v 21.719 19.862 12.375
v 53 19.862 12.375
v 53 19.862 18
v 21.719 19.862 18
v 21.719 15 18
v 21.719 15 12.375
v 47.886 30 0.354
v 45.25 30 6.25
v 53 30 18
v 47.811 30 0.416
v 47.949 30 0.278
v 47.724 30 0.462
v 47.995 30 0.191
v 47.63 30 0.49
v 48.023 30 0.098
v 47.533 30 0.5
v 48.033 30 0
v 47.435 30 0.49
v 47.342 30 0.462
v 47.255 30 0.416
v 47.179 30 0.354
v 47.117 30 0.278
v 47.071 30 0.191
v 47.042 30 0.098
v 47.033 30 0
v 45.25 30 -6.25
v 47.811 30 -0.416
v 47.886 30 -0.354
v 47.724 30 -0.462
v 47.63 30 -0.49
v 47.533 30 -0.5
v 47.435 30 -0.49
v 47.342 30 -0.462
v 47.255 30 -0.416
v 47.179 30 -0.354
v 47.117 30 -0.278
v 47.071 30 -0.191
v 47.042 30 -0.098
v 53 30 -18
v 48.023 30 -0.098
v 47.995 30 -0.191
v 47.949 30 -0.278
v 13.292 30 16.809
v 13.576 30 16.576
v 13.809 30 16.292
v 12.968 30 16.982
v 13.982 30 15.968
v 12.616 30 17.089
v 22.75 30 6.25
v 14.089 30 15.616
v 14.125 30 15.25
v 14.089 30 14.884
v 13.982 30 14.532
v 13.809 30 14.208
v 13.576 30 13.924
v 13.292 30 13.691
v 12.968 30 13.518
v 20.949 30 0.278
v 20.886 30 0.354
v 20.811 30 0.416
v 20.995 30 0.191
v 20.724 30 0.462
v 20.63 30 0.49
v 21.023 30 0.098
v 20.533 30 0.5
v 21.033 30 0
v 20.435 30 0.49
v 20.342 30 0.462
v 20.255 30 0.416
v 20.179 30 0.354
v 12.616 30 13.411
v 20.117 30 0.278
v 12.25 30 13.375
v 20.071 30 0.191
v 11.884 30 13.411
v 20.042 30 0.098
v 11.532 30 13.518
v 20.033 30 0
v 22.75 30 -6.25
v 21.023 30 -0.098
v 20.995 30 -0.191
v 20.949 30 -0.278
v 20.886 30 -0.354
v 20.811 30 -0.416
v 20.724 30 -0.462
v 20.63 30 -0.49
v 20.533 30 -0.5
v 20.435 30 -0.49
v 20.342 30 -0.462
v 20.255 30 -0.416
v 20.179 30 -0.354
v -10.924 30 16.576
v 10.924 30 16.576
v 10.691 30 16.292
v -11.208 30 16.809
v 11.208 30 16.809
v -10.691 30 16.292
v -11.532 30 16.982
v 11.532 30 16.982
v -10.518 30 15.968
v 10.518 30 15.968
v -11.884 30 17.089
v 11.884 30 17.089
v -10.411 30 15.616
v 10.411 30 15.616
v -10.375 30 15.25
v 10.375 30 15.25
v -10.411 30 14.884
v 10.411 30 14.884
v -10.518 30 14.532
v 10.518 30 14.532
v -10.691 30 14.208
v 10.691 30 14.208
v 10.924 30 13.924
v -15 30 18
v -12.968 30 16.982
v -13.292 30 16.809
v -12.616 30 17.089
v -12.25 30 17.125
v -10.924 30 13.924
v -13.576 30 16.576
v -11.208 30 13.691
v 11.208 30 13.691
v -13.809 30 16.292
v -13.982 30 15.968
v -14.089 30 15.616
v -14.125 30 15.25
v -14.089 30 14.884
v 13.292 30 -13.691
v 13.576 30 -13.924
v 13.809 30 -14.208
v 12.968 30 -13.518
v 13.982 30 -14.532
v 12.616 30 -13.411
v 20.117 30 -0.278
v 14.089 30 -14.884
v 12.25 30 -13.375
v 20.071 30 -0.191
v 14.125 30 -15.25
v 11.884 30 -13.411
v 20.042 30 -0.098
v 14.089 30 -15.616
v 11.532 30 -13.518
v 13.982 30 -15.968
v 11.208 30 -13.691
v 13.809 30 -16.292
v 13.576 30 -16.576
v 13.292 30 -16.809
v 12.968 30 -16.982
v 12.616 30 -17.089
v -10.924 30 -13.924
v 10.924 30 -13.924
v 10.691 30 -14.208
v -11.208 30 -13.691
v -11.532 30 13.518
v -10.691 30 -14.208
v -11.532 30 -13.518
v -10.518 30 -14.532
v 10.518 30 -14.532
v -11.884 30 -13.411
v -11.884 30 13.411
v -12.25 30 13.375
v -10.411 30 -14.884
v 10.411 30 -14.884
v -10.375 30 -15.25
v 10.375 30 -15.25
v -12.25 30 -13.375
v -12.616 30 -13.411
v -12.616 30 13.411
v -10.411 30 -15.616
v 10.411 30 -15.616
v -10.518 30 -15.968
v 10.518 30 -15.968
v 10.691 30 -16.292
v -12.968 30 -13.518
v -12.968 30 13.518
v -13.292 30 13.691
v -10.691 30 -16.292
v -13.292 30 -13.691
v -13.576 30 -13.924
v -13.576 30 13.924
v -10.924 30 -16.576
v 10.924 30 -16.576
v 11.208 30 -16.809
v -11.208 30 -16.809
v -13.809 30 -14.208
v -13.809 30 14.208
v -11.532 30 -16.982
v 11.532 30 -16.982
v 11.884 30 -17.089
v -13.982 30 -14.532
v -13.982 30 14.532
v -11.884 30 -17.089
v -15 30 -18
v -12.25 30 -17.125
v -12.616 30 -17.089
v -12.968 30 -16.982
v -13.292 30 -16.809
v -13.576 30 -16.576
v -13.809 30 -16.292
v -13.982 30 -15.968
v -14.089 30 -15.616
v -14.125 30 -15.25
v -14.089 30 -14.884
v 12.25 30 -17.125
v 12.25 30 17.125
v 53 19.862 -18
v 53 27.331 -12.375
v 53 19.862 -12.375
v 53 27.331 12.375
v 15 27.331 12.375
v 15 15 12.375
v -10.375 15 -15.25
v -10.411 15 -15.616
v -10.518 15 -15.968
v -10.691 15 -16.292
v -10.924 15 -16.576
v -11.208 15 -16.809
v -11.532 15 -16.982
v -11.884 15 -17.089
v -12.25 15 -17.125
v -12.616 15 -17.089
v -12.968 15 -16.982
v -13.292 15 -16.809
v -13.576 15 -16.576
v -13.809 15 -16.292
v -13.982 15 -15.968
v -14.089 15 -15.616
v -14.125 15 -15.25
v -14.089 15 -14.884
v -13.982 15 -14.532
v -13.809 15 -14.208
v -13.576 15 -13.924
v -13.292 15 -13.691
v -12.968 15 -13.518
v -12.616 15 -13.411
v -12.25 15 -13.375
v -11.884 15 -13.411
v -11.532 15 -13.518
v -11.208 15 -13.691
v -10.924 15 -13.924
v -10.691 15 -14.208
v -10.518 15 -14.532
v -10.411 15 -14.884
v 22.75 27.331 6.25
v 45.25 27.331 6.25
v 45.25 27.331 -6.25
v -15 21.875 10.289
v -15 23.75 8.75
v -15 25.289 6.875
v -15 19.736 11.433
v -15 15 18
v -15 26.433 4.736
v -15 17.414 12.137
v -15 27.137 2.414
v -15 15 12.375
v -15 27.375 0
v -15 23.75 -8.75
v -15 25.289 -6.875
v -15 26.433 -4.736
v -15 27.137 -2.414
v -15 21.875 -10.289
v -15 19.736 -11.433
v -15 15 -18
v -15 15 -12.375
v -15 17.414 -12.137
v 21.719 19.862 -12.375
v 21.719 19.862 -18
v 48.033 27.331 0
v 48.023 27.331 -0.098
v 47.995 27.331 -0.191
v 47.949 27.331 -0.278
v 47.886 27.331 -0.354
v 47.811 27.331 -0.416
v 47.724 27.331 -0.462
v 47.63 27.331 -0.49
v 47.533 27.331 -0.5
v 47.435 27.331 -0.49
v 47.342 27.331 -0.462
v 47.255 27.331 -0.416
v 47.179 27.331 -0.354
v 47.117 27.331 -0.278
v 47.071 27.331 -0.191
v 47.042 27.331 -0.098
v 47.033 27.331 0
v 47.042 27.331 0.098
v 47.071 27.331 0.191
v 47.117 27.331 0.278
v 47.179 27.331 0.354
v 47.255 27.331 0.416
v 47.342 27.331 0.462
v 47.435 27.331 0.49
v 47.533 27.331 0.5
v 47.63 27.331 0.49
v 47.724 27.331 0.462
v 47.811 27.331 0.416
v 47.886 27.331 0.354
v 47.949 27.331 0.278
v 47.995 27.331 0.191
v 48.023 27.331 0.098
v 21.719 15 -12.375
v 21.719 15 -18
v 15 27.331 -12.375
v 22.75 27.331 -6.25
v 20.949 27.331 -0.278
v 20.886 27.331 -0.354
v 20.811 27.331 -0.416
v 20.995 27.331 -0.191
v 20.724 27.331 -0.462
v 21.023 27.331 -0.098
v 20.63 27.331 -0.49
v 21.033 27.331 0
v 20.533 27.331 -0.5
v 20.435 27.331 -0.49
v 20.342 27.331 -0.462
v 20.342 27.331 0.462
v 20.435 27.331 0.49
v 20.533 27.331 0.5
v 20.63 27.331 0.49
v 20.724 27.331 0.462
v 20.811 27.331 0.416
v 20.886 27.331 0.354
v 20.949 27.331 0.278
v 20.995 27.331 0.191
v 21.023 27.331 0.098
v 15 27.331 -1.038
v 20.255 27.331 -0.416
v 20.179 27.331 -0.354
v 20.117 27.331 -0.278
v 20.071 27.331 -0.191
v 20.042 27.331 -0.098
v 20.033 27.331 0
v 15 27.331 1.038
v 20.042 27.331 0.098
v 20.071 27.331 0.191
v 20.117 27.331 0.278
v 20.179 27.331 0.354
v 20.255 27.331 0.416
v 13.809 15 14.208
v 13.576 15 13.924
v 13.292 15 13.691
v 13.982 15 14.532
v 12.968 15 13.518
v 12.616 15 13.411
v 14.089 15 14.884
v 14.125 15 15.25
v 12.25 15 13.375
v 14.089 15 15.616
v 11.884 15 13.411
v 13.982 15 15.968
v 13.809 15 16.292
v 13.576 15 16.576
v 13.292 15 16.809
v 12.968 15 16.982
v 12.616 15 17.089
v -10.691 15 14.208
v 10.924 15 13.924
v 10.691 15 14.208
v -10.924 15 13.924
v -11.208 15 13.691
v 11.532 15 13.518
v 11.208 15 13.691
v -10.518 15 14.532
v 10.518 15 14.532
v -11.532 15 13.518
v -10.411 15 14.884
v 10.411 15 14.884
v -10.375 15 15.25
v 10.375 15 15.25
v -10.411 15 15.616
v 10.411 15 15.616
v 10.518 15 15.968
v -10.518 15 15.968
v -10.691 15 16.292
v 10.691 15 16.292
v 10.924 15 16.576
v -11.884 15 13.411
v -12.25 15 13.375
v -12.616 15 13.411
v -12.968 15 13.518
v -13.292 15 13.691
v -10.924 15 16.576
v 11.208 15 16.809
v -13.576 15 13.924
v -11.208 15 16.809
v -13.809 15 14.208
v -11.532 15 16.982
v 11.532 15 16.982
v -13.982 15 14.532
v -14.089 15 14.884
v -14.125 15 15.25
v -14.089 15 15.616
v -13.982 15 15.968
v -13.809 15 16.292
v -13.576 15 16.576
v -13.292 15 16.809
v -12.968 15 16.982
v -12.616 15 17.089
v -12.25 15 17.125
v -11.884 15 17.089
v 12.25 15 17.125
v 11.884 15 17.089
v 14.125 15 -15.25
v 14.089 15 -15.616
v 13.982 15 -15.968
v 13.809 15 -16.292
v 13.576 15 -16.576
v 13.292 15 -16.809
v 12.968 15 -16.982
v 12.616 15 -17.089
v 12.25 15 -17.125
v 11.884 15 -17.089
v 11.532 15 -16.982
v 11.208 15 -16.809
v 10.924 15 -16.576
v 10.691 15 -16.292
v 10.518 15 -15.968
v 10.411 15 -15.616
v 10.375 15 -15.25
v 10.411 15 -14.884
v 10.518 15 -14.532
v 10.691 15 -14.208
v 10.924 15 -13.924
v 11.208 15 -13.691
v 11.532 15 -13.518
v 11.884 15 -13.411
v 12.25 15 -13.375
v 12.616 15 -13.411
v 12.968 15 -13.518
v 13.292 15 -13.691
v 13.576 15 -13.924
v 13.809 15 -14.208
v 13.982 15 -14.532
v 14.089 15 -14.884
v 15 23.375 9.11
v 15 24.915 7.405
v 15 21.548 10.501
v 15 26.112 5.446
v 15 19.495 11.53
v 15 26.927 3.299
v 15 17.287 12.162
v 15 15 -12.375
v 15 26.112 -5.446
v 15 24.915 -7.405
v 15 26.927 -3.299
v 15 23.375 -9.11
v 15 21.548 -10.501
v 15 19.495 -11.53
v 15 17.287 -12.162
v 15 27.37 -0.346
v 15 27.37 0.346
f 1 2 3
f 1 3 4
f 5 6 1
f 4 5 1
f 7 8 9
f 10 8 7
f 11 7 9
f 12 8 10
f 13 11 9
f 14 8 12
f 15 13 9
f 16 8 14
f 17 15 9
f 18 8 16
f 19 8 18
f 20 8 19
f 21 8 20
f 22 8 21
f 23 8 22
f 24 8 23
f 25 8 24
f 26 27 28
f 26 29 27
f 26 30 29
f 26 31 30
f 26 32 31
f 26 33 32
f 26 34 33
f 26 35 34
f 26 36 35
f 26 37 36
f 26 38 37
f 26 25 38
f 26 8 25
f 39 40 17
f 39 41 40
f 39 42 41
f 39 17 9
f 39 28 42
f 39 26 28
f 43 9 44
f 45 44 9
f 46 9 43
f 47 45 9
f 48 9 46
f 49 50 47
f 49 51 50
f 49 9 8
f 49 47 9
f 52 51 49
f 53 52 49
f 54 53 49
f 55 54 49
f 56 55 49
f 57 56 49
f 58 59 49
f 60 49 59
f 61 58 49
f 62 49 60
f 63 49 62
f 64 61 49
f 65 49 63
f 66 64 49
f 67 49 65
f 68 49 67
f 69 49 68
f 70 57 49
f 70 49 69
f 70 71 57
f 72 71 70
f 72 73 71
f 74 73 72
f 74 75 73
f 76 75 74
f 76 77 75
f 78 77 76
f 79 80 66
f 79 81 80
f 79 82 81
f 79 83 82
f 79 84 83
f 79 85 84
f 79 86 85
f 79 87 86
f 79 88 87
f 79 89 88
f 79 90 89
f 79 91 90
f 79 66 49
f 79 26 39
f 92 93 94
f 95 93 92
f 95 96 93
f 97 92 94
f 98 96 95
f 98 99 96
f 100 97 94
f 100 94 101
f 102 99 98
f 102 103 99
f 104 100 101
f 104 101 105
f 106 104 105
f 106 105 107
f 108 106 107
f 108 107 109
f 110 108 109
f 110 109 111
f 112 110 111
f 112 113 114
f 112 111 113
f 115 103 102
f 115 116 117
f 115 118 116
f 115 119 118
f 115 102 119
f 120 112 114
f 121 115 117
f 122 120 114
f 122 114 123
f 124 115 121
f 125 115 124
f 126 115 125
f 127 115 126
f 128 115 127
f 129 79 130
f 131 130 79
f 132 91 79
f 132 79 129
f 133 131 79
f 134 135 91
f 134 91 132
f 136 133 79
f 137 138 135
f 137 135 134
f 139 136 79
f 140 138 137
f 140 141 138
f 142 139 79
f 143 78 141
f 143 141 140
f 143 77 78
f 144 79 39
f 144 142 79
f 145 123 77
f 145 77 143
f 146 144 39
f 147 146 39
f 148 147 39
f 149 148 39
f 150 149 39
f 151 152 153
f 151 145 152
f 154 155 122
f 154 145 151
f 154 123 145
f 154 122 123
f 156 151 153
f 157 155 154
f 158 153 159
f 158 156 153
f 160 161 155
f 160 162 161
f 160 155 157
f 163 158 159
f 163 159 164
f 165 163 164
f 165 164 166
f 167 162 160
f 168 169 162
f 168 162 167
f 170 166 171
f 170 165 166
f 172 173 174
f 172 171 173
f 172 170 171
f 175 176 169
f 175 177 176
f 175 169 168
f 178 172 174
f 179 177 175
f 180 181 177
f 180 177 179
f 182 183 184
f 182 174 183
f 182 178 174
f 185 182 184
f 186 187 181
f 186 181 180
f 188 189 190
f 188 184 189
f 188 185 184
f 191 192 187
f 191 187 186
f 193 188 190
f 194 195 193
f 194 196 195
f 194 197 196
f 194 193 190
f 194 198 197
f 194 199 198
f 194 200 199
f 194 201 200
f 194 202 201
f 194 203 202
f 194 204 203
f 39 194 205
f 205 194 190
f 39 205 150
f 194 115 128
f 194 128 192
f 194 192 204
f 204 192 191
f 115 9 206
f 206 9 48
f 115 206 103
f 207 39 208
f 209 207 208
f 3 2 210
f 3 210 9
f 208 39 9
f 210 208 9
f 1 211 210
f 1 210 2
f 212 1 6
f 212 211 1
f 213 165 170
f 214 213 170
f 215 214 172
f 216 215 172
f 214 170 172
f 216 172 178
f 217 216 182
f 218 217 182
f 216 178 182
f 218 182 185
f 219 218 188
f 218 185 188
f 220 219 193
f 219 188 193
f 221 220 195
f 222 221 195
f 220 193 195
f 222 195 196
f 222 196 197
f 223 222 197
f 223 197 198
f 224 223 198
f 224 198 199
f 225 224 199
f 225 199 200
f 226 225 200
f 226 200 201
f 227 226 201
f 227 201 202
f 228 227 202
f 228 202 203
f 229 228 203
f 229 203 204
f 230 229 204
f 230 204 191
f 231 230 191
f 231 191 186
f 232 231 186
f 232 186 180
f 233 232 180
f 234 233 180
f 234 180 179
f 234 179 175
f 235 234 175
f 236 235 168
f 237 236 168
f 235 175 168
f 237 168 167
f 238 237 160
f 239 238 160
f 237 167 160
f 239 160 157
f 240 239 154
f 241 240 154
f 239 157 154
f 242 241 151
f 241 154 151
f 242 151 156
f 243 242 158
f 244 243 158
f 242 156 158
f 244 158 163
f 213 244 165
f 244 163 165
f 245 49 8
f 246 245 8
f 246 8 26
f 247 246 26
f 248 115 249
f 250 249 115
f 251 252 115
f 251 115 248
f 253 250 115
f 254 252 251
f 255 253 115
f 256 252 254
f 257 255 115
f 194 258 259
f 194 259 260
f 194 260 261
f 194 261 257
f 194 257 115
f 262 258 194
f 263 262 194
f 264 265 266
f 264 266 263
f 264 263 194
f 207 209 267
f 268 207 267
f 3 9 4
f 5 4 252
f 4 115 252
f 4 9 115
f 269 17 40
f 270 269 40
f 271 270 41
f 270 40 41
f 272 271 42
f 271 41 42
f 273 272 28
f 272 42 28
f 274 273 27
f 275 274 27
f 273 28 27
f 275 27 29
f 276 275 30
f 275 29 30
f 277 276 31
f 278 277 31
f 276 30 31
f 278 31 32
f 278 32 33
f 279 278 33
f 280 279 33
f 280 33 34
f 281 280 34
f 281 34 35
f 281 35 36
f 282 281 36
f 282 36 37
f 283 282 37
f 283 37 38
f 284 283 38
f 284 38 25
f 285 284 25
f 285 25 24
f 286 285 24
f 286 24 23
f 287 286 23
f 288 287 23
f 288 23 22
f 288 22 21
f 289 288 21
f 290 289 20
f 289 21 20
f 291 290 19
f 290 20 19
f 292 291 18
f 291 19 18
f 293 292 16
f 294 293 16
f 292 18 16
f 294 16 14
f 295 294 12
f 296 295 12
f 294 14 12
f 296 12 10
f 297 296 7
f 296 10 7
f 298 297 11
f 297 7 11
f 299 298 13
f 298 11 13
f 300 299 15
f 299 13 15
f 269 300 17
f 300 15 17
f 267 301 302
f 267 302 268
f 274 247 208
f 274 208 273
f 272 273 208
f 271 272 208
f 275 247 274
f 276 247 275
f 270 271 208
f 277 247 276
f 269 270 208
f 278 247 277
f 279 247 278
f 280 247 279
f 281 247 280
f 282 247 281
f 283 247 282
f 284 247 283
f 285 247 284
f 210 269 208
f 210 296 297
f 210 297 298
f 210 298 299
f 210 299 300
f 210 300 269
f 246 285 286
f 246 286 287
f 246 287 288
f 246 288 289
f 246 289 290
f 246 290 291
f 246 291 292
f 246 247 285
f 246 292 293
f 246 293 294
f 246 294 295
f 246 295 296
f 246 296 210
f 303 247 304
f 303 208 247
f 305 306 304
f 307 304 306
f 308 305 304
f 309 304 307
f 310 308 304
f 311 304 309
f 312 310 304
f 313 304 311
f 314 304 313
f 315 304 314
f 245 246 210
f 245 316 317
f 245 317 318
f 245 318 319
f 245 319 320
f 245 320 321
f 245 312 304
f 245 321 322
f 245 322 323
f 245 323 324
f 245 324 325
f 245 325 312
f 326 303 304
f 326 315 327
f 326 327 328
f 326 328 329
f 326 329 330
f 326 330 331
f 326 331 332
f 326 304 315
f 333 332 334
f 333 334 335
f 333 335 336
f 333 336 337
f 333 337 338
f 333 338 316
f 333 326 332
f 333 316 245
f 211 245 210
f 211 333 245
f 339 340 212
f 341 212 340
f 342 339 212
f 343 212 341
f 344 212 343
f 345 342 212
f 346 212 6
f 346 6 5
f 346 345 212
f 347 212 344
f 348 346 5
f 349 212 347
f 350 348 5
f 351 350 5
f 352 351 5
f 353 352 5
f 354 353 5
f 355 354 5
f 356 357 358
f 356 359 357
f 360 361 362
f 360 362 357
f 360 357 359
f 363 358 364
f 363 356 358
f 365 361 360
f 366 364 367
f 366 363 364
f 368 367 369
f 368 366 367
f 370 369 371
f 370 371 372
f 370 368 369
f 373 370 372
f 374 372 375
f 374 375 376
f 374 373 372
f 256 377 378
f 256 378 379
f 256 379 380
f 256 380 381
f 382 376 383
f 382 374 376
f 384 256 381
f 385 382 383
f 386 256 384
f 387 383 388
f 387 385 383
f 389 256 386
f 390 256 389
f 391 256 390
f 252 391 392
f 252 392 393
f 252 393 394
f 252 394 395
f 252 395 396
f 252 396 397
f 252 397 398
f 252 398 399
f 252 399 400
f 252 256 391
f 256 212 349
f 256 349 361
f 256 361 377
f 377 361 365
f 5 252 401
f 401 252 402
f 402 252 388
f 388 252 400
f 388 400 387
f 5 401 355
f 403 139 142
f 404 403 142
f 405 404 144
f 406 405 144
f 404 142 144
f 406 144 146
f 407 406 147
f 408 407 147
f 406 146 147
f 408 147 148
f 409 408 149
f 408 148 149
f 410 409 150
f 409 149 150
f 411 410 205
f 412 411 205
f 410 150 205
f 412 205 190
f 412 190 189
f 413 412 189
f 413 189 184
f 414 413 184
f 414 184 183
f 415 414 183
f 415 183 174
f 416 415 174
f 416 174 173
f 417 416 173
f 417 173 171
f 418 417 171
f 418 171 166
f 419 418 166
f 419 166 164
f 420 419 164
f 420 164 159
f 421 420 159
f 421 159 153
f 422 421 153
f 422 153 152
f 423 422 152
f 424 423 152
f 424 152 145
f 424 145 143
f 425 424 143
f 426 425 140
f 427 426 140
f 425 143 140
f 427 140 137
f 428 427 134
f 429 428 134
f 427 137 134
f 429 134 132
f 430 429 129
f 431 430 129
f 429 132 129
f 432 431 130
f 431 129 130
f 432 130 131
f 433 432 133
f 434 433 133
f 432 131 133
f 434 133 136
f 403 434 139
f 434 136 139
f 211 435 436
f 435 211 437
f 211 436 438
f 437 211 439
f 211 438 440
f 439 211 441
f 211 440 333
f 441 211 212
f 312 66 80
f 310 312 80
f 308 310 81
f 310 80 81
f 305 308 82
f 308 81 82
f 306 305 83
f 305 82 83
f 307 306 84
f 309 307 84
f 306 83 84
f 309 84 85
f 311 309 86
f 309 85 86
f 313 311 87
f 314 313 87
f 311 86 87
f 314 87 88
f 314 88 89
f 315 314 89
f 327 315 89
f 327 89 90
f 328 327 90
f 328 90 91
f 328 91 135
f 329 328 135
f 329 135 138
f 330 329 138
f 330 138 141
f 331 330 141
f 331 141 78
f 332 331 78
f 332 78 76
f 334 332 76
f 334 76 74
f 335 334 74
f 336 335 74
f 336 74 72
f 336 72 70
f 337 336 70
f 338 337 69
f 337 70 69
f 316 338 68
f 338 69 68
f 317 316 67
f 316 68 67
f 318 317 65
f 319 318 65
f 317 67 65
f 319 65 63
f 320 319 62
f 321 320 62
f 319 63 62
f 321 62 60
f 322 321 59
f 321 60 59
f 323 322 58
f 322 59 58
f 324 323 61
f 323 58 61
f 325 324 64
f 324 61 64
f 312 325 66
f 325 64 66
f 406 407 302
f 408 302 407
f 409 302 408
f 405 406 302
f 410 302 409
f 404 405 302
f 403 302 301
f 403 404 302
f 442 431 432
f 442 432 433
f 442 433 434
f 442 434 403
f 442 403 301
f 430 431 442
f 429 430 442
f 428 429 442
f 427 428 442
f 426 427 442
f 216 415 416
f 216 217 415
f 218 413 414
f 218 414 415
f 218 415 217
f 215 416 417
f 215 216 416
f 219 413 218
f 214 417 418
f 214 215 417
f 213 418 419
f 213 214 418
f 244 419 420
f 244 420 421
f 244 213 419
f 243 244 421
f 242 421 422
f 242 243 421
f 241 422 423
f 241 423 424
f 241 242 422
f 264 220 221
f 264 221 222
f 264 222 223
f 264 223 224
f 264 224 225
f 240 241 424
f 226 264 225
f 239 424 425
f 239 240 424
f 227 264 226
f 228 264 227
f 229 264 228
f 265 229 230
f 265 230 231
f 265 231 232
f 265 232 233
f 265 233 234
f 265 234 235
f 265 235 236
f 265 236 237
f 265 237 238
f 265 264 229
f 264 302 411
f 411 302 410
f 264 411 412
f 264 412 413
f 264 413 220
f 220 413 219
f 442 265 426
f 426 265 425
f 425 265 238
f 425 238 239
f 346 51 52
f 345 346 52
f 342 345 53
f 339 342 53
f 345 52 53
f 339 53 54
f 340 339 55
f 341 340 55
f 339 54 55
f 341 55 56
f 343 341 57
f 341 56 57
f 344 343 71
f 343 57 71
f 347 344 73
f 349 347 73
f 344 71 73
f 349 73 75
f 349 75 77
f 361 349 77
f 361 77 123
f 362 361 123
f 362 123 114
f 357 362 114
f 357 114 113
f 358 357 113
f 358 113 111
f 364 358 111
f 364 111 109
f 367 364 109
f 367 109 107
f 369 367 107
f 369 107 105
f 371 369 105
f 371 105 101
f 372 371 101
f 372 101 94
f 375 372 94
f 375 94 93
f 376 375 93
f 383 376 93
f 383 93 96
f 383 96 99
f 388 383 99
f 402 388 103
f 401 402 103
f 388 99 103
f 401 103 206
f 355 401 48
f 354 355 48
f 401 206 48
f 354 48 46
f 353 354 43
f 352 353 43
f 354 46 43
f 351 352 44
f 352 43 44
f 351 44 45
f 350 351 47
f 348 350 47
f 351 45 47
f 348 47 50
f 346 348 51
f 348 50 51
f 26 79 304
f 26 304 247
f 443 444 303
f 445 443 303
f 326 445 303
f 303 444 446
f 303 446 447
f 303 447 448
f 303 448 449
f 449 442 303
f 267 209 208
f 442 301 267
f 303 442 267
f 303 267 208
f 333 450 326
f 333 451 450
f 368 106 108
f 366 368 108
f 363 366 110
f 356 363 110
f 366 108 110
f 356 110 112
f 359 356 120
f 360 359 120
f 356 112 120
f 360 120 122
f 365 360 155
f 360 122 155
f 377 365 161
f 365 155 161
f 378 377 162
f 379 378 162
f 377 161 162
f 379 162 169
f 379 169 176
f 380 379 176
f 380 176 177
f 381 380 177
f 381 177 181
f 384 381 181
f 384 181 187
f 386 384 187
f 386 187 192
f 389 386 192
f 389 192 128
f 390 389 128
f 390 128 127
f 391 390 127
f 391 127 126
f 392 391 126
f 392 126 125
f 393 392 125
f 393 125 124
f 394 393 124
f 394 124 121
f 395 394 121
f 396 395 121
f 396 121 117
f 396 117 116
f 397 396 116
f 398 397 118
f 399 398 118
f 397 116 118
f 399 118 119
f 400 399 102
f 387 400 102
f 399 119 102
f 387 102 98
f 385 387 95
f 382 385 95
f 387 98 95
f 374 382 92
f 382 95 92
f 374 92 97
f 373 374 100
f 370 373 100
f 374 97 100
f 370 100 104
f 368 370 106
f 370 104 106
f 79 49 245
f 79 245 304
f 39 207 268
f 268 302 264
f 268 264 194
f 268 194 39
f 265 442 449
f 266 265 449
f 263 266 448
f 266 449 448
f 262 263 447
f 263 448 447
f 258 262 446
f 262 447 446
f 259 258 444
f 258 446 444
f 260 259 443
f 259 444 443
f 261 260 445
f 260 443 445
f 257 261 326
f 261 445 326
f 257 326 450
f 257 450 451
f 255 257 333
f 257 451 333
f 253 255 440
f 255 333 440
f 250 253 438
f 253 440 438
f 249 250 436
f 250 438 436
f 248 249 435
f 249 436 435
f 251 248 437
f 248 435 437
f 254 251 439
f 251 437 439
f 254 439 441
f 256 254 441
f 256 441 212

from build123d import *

# Parameters (mm, degrees)
SKETCH1_W               = 30
SKETCH1_H               = 36
BOSS_EXTRUDE1_DEPTH     = 30
SKETCH3_R               = 12.375
CUT_EXTRUDE1_DEPTH      = 40
SKETCH5_R               = 1.875
CUT_EXTRUDE2_DEPTH      = 40
CUT_EXTRUDE3_START      = 15
SKETCH7_W               = 36
SKETCH7_H               = 15
CUT_EXTRUDE3_DEPTH      = 31
BOSS_EXTRUDE2_DEPTH     = 38
SKETCH9_R               = 0.5
SKETCH9_W               = 22.5
SKETCH9_H               = 12.5
CUT_EXTRUDE4_DEPTH      = 10
SKETCH10_W              = 31.281266854
SKETCH10_H              = 4.861672308
CUT_EXTRUDE6_DEPTH      = 31.375
CUT_EXTRUDE6_DEPTH_BACK = 6.625


with BuildPart() as part:
    # Sketch1 → Boss-Extrude1 (new body)
    with BuildSketch(Plane(origin=(0, 0, 0), x_dir=(1, 0, 0), z_dir=(0, 1, 0))):
        Rectangle(SKETCH1_W, SKETCH1_H)
    extrude(amount=BOSS_EXTRUDE1_DEPTH)

    # Sketch3 → Cut-Extrude1 (cut)
    with BuildSketch(Plane(origin=(15, 0, 0), x_dir=(0, 0, -1), z_dir=(1, 0, 0))):
        with Locations((0, 15)):
            Circle(SKETCH3_R)
    extrude(amount=-CUT_EXTRUDE1_DEPTH, mode=Mode.SUBTRACT)

    # Sketch5 → Cut-Extrude2 (cut)
    with BuildSketch(Plane(origin=(0, 30, 0), x_dir=(1, 0, 0), z_dir=(0, 1, 0))):
        with Locations((-12.25, 15.25)):
            Circle(SKETCH5_R)
        with Locations((-12.25, -15.25)):
            Circle(SKETCH5_R)
        with Locations((12.25, -15.25)):
            Circle(SKETCH5_R)
        with Locations((12.25, 15.25)):
            Circle(SKETCH5_R)
    extrude(amount=-CUT_EXTRUDE2_DEPTH, mode=Mode.SUBTRACT)

    # Sketch7 → Cut-Extrude3 (cut, through all)
    with BuildSketch(Plane(origin=(0, 0, 0), x_dir=(0, 0, -1), z_dir=(1, 0, 0)).offset(CUT_EXTRUDE3_START)):
        with Locations((0, 7.5)):
            Rectangle(SKETCH7_W, SKETCH7_H)
    extrude(amount=-CUT_EXTRUDE3_DEPTH, mode=Mode.SUBTRACT)

    # Sketch8 → Boss-Extrude2 (add)
    with BuildSketch(Plane(origin=(15, 0, 0), x_dir=(0, 0, -1), z_dir=(1, 0, 0))):
        Polygon((-18, 30), (18, 30), (18, 27.331397605), (18, 15), (12.375, 15), (12.375, 27.331397605), (-12.375, 27.331397605), (-12.375, 15), (-18, 15), (-18, 27.331397605), align=None)
    extrude(amount=BOSS_EXTRUDE2_DEPTH)

    # Sketch9 → Cut-Extrude4 (cut)
    with BuildSketch(Plane(origin=(0, 30, 0), x_dir=(1, 0, 0), z_dir=(0, 1, 0))):
        with Locations((20.532846914, 0)):
            Circle(SKETCH9_R)
        with Locations((47.532846914, 0)):
            Circle(SKETCH9_R)
        with Locations((34, 0)):
            Rectangle(SKETCH9_W, SKETCH9_H)
    extrude(amount=-CUT_EXTRUDE4_DEPTH, mode=Mode.SUBTRACT)

    # Sketch10 → Cut-Extrude6 (cut, two sides)
    with BuildSketch(Plane(origin=(0, 0, 12.375), x_dir=(-1, 0, 0), z_dir=(0, 0, -1))) as cut_extrude6_sk:
        with Locations((-37.359366573, 17.430836154)):
            Rectangle(SKETCH10_W, SKETCH10_H)
    extrude(amount=CUT_EXTRUDE6_DEPTH, mode=Mode.SUBTRACT)
    extrude(cut_extrude6_sk.sketch, amount=-CUT_EXTRUDE6_DEPTH_BACK, mode=Mode.SUBTRACT)


solid = part.part
